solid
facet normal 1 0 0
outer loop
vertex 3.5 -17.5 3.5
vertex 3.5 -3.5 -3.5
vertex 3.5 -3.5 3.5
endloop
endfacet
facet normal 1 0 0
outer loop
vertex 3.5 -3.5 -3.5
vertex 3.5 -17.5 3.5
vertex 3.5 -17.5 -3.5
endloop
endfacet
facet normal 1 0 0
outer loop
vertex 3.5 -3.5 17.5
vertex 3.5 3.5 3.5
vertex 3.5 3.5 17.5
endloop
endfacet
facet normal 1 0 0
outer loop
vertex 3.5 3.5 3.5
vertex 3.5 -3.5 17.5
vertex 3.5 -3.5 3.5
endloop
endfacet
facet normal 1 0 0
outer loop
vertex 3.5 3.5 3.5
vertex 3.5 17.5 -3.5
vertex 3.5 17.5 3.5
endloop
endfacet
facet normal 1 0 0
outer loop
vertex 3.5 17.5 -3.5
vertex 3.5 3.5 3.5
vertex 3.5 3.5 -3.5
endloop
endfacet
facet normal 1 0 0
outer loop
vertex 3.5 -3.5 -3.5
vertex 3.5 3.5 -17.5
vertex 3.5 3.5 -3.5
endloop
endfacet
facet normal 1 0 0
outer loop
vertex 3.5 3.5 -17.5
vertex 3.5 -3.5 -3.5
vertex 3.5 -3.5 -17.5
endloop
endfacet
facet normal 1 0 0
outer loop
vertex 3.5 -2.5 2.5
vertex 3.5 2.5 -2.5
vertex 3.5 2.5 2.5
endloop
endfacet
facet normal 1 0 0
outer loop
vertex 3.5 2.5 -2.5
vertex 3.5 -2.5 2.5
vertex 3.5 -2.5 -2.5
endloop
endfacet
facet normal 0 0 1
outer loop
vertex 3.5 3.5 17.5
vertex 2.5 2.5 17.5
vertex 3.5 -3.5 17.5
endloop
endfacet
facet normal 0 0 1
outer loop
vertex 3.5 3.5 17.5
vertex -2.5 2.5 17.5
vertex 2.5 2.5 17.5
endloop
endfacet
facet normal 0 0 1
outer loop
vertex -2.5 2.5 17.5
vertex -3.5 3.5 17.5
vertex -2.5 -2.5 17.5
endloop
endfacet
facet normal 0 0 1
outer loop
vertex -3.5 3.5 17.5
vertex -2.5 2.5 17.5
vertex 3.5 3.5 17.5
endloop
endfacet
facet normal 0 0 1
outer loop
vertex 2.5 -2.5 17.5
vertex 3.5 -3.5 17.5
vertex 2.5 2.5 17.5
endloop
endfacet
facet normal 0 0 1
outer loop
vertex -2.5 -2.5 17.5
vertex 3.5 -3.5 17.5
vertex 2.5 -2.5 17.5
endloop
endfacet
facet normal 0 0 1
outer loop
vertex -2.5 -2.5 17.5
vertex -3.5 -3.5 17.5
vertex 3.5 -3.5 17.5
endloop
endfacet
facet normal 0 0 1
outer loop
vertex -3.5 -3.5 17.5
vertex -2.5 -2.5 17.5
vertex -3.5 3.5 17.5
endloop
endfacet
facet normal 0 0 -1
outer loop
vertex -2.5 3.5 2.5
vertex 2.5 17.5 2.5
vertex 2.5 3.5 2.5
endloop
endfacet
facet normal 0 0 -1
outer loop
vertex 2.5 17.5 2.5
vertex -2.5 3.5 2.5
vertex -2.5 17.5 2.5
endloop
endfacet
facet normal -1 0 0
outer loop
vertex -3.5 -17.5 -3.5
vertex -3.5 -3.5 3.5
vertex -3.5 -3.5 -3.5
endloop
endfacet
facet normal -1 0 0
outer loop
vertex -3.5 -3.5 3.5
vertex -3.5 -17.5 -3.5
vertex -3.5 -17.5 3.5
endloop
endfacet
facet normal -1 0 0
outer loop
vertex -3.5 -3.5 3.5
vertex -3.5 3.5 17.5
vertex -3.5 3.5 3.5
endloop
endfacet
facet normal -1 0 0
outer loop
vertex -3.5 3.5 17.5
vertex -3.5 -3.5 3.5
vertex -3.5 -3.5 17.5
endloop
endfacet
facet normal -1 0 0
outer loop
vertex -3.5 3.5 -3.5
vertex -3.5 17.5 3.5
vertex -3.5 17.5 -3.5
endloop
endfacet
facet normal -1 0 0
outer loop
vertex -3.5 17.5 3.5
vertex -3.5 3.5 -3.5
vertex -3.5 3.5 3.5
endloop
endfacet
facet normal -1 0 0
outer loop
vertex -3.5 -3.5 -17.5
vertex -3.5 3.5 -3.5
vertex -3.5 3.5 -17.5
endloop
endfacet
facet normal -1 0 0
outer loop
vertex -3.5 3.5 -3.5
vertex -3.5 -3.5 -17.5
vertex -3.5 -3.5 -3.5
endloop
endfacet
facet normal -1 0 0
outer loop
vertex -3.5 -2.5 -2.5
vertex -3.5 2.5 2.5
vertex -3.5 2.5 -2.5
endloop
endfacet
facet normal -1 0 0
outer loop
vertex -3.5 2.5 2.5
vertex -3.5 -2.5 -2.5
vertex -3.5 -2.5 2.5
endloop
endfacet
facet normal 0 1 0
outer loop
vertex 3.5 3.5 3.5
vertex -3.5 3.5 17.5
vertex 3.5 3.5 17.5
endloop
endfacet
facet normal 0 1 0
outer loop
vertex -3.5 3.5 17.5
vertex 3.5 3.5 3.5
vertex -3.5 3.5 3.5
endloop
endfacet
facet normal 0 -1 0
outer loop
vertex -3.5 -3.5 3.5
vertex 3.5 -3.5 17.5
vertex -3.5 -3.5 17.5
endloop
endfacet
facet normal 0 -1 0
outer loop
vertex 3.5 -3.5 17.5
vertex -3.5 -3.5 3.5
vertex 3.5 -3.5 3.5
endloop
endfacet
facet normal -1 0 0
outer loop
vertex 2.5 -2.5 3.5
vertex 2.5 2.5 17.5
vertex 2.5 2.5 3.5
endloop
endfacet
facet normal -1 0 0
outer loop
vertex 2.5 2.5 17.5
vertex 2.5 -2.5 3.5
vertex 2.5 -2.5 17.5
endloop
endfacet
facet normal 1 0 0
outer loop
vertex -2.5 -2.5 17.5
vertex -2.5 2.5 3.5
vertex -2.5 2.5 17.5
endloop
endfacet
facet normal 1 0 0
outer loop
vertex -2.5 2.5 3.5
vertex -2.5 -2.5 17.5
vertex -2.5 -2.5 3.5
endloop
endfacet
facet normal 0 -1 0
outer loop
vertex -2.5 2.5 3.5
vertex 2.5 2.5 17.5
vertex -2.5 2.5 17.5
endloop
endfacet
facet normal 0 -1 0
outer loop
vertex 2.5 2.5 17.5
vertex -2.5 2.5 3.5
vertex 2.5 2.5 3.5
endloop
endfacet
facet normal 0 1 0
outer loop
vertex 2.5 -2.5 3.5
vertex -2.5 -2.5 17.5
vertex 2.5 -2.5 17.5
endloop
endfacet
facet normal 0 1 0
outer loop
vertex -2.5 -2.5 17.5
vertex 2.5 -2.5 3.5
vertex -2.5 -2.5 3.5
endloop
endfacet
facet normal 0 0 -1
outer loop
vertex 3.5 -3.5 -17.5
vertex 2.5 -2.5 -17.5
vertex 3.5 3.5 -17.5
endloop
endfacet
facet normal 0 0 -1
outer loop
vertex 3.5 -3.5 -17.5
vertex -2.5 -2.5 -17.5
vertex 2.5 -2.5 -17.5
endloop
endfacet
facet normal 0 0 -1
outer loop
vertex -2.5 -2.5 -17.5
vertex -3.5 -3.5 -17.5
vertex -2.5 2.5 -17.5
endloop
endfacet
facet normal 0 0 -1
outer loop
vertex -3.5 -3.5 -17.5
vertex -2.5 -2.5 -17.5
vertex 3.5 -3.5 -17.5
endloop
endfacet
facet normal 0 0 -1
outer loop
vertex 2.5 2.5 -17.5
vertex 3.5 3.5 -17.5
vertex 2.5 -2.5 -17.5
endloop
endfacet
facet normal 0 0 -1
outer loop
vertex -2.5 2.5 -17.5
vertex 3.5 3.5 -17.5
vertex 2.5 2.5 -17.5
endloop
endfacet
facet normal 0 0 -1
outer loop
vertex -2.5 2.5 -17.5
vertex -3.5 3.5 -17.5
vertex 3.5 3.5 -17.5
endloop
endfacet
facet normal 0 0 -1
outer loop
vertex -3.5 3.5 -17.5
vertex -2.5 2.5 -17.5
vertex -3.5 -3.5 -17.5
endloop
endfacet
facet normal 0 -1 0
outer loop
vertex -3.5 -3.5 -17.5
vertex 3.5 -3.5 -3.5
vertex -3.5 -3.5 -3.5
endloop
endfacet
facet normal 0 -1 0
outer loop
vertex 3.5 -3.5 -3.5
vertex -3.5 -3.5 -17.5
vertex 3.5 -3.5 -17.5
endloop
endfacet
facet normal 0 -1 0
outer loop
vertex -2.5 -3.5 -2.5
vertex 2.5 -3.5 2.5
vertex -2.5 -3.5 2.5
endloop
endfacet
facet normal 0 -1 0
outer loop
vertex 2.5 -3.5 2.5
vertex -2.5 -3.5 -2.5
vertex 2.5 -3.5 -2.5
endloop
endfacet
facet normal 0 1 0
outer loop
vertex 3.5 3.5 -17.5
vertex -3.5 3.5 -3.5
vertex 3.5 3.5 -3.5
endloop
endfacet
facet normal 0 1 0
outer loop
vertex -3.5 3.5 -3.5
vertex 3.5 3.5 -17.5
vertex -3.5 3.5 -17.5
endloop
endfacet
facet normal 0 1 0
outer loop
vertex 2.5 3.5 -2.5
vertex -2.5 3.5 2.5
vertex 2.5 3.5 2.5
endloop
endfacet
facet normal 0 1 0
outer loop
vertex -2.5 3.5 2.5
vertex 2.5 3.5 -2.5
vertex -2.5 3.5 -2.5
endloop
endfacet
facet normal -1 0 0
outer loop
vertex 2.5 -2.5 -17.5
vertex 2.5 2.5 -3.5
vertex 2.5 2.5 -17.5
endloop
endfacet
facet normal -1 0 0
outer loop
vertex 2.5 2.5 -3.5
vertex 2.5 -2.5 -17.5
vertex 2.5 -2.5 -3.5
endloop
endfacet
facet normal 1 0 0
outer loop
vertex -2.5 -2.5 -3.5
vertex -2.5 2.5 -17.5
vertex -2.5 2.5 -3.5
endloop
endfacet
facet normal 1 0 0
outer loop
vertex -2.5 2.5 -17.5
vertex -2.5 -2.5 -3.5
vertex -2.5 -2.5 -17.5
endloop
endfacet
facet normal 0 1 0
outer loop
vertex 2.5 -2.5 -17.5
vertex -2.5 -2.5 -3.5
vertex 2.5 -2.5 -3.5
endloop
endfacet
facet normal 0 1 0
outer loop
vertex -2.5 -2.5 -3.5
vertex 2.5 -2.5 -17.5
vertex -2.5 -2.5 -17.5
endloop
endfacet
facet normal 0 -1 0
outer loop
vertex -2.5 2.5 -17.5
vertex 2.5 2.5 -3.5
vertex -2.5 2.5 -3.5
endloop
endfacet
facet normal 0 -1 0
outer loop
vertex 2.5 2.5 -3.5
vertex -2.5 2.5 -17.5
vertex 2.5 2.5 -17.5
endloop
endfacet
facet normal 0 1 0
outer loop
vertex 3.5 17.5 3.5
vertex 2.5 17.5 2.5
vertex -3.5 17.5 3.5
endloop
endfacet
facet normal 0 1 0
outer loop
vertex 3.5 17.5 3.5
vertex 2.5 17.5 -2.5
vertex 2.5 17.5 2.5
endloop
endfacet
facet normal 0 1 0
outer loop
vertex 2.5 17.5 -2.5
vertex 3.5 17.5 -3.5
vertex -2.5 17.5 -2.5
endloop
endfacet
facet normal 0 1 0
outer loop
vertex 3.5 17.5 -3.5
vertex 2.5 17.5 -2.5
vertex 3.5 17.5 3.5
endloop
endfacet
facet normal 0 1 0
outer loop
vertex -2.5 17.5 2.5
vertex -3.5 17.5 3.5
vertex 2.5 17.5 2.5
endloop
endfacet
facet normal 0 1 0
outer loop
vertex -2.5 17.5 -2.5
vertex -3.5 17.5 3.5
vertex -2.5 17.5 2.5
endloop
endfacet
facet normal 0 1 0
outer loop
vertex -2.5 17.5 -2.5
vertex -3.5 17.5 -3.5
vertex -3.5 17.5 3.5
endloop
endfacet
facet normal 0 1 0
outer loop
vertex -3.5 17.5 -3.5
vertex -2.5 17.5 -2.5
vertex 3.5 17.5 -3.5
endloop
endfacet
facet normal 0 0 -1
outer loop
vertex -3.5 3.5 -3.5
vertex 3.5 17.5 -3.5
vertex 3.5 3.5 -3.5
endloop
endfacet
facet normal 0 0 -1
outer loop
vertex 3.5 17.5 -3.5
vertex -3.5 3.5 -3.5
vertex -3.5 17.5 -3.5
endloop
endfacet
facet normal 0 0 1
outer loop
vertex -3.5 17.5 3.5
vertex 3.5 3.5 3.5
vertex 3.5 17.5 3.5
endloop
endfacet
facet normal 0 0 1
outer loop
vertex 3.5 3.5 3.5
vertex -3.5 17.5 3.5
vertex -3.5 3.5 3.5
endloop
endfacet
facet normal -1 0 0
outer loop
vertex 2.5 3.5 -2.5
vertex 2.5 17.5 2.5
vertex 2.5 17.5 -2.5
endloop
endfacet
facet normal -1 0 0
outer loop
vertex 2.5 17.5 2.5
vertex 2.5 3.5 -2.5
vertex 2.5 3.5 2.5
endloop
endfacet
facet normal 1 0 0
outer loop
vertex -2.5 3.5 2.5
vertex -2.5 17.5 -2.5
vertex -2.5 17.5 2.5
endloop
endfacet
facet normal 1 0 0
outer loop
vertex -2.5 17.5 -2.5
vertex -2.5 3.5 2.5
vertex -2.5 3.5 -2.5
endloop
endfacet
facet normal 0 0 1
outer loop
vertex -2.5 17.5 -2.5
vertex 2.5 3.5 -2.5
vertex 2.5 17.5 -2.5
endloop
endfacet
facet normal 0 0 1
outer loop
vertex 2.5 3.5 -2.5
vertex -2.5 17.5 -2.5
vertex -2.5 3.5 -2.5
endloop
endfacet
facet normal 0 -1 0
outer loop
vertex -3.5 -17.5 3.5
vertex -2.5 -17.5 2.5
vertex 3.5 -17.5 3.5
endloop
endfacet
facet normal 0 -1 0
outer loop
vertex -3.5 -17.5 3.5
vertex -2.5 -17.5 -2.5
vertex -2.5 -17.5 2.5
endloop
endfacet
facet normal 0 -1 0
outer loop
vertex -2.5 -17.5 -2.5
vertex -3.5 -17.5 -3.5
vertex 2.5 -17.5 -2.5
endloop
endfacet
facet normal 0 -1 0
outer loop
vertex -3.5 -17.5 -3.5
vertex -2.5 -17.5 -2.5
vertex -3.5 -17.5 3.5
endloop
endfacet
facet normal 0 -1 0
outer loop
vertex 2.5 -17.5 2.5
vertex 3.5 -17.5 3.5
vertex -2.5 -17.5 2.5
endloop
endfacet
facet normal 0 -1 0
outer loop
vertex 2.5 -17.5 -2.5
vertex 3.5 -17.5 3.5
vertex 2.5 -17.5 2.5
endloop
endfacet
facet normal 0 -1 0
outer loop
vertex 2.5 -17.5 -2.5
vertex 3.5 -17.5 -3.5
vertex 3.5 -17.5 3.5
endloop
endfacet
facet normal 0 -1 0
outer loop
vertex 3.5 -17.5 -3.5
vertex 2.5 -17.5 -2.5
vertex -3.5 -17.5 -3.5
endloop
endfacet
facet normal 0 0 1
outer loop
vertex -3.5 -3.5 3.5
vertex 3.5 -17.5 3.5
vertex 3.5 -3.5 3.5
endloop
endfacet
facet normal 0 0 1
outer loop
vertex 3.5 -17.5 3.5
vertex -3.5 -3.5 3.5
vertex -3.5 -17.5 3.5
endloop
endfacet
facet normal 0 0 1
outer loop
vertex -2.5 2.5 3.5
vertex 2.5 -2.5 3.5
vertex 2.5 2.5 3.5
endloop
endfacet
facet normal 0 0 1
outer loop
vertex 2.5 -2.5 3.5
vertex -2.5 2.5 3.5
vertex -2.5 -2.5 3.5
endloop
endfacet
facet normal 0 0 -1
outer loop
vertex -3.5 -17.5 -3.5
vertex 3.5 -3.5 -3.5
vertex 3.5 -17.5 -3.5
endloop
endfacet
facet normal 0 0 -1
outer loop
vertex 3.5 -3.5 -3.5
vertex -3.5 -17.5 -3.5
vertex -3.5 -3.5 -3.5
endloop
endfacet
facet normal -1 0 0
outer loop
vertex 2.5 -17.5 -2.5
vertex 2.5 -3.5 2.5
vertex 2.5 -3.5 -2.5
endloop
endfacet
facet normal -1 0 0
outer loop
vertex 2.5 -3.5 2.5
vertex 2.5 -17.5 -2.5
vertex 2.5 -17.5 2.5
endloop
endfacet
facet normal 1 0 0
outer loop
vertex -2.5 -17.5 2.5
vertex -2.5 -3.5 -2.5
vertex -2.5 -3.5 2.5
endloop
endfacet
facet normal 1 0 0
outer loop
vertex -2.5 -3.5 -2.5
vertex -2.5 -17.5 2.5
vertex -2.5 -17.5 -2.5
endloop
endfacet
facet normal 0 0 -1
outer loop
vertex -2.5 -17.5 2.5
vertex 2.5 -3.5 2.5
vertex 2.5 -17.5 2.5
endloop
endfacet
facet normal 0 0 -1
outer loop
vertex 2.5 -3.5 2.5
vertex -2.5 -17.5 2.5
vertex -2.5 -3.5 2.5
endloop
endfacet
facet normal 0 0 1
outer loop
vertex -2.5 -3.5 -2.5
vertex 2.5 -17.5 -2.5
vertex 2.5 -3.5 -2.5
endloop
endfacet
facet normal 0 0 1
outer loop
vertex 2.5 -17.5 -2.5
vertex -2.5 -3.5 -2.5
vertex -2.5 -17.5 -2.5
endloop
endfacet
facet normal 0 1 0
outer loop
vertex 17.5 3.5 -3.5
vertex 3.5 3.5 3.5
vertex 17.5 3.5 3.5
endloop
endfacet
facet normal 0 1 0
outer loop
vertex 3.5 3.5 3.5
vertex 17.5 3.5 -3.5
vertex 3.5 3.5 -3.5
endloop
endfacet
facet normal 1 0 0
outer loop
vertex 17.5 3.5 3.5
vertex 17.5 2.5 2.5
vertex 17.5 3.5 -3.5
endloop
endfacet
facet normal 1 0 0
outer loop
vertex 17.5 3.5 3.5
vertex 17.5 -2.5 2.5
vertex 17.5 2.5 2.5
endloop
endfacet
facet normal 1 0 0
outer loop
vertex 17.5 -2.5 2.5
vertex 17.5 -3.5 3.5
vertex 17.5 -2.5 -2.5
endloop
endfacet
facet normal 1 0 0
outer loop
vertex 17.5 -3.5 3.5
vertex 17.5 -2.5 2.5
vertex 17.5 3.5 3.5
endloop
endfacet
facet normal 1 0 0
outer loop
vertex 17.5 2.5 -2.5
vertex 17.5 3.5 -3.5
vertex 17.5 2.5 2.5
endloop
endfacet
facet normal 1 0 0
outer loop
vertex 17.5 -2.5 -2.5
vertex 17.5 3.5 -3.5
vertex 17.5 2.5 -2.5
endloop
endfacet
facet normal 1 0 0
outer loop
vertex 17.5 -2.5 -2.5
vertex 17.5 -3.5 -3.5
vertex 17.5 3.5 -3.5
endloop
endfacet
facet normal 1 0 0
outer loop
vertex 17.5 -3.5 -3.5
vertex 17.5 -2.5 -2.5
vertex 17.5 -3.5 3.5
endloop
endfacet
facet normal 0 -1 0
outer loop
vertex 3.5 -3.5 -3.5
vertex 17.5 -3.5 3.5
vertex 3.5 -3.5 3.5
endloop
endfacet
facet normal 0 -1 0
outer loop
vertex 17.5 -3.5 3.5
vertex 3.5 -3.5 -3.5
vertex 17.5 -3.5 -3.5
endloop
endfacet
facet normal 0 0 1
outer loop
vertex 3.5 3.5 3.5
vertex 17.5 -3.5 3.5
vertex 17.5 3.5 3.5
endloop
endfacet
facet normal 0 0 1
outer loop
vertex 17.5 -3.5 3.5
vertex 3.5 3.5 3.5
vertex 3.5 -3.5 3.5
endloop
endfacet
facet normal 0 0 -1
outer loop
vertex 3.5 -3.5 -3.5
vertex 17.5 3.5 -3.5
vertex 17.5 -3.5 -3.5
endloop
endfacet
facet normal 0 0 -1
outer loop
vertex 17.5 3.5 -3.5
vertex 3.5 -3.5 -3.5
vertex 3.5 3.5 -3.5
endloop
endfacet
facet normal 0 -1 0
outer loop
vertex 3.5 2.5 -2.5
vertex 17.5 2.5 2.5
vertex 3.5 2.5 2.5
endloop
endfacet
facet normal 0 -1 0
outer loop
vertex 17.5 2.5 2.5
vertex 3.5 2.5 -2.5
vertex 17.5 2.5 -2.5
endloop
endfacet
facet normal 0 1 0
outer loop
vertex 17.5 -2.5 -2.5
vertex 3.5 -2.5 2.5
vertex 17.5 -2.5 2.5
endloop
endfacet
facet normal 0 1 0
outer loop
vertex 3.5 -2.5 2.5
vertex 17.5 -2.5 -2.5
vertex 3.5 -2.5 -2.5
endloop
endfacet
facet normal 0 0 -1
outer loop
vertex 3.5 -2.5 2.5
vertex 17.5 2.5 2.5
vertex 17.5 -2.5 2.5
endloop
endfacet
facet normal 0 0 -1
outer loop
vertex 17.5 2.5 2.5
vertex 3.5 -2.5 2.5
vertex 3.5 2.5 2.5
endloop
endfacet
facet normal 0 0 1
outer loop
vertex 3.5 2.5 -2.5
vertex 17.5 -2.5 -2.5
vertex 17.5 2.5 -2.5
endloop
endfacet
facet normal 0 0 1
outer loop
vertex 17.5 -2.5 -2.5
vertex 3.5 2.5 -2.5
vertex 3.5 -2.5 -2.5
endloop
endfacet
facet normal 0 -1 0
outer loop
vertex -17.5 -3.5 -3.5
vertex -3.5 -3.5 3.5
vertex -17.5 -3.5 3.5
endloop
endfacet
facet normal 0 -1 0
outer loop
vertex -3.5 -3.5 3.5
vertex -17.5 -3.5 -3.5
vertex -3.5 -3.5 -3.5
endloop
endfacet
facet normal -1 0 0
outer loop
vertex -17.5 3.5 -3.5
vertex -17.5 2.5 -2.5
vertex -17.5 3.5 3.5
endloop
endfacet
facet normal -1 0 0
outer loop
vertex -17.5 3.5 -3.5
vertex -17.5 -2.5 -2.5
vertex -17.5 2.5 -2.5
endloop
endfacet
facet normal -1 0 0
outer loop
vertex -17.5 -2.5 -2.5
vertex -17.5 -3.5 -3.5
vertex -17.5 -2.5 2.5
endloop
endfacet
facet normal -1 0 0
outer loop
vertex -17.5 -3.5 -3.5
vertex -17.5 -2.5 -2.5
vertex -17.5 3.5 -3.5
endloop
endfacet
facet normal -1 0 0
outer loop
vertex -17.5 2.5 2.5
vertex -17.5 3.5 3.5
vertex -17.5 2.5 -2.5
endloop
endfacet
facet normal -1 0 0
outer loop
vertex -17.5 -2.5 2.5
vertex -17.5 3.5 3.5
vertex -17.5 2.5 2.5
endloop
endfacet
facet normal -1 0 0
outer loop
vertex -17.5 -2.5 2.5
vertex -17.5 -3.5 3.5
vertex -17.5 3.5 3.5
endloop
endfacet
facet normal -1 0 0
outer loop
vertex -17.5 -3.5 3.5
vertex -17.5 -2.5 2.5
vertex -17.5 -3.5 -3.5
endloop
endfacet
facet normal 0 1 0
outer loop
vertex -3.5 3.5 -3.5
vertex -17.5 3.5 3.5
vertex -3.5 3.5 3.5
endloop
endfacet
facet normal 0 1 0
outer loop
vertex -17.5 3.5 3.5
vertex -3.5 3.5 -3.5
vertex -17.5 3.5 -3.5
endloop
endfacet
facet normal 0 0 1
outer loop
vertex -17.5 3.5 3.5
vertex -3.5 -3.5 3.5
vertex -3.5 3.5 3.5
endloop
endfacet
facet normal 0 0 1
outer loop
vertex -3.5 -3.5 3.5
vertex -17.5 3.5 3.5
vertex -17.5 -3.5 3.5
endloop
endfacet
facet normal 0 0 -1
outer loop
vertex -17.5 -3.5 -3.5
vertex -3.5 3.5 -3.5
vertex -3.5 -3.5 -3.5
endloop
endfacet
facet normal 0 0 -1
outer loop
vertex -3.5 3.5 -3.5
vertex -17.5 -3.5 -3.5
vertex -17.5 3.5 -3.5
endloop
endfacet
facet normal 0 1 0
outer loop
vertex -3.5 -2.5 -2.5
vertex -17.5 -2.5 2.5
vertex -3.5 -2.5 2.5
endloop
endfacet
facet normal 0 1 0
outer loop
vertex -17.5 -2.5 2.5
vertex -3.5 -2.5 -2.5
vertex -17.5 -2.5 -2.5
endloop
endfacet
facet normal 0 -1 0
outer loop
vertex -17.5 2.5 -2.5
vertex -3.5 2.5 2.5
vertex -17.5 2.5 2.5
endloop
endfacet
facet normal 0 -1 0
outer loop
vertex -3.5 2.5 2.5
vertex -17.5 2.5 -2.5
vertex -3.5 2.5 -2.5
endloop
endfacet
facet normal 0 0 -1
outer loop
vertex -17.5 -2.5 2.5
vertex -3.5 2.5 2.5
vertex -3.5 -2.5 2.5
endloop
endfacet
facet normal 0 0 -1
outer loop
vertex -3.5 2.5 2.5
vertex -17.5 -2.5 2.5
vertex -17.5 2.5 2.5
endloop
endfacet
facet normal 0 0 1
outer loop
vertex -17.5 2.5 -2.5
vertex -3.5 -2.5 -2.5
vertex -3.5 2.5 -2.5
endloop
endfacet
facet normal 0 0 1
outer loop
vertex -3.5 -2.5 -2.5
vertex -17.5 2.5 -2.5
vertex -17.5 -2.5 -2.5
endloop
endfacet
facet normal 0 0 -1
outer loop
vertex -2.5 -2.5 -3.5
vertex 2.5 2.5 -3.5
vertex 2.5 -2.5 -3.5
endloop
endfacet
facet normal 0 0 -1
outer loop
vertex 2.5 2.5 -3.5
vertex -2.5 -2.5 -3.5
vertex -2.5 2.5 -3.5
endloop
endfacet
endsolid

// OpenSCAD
// Combination of n,s,e,w,u,d (lower case = no support, upper case=with support)
directions = "nsewud";

cube([7,7,7],center=true);


if (search("u",directions)) stick(); //up
if (search("d",directions)) rotate ([180,0,0]) stick("yellow",false);
if (search("n",directions)) rotate ([-90,0,0]) stick("green",false);
if (search("s",directions)) rotate ([90,0,0]) stick("blue",false);
if (search("e",directions)) rotate ([90,0,90]) stick("white",false);
if (search("w",directions)) rotate ([90,0,-90]) stick("brown",false);

if (search("U",directions)) stick("red",true); //up
if (search("D",directions)) rotate ([180,0,0]) stick("yellow",true);
if (search("N",directions)) rotate ([-90,0,0]) stick("green",true);
if (search("S",directions)) rotate ([90,0,0]) stick("blue",true);
if (search("E",directions)) rotate ([90,0,90]) stick("white",true);
if (search("W",directions)) rotate ([90,0,-90]) stick("brown",true);

module stick(col="red",support=false) {
    color(col){
        translate ([0,0,10]) {
            if (support==true) translate ([0,0,0.5]) cube([0.1,7,13],center=true);
            difference() {
                cube([7,7,15],center=true);
                cube([5,5,17],center=true);
            }
        }
    }
}
